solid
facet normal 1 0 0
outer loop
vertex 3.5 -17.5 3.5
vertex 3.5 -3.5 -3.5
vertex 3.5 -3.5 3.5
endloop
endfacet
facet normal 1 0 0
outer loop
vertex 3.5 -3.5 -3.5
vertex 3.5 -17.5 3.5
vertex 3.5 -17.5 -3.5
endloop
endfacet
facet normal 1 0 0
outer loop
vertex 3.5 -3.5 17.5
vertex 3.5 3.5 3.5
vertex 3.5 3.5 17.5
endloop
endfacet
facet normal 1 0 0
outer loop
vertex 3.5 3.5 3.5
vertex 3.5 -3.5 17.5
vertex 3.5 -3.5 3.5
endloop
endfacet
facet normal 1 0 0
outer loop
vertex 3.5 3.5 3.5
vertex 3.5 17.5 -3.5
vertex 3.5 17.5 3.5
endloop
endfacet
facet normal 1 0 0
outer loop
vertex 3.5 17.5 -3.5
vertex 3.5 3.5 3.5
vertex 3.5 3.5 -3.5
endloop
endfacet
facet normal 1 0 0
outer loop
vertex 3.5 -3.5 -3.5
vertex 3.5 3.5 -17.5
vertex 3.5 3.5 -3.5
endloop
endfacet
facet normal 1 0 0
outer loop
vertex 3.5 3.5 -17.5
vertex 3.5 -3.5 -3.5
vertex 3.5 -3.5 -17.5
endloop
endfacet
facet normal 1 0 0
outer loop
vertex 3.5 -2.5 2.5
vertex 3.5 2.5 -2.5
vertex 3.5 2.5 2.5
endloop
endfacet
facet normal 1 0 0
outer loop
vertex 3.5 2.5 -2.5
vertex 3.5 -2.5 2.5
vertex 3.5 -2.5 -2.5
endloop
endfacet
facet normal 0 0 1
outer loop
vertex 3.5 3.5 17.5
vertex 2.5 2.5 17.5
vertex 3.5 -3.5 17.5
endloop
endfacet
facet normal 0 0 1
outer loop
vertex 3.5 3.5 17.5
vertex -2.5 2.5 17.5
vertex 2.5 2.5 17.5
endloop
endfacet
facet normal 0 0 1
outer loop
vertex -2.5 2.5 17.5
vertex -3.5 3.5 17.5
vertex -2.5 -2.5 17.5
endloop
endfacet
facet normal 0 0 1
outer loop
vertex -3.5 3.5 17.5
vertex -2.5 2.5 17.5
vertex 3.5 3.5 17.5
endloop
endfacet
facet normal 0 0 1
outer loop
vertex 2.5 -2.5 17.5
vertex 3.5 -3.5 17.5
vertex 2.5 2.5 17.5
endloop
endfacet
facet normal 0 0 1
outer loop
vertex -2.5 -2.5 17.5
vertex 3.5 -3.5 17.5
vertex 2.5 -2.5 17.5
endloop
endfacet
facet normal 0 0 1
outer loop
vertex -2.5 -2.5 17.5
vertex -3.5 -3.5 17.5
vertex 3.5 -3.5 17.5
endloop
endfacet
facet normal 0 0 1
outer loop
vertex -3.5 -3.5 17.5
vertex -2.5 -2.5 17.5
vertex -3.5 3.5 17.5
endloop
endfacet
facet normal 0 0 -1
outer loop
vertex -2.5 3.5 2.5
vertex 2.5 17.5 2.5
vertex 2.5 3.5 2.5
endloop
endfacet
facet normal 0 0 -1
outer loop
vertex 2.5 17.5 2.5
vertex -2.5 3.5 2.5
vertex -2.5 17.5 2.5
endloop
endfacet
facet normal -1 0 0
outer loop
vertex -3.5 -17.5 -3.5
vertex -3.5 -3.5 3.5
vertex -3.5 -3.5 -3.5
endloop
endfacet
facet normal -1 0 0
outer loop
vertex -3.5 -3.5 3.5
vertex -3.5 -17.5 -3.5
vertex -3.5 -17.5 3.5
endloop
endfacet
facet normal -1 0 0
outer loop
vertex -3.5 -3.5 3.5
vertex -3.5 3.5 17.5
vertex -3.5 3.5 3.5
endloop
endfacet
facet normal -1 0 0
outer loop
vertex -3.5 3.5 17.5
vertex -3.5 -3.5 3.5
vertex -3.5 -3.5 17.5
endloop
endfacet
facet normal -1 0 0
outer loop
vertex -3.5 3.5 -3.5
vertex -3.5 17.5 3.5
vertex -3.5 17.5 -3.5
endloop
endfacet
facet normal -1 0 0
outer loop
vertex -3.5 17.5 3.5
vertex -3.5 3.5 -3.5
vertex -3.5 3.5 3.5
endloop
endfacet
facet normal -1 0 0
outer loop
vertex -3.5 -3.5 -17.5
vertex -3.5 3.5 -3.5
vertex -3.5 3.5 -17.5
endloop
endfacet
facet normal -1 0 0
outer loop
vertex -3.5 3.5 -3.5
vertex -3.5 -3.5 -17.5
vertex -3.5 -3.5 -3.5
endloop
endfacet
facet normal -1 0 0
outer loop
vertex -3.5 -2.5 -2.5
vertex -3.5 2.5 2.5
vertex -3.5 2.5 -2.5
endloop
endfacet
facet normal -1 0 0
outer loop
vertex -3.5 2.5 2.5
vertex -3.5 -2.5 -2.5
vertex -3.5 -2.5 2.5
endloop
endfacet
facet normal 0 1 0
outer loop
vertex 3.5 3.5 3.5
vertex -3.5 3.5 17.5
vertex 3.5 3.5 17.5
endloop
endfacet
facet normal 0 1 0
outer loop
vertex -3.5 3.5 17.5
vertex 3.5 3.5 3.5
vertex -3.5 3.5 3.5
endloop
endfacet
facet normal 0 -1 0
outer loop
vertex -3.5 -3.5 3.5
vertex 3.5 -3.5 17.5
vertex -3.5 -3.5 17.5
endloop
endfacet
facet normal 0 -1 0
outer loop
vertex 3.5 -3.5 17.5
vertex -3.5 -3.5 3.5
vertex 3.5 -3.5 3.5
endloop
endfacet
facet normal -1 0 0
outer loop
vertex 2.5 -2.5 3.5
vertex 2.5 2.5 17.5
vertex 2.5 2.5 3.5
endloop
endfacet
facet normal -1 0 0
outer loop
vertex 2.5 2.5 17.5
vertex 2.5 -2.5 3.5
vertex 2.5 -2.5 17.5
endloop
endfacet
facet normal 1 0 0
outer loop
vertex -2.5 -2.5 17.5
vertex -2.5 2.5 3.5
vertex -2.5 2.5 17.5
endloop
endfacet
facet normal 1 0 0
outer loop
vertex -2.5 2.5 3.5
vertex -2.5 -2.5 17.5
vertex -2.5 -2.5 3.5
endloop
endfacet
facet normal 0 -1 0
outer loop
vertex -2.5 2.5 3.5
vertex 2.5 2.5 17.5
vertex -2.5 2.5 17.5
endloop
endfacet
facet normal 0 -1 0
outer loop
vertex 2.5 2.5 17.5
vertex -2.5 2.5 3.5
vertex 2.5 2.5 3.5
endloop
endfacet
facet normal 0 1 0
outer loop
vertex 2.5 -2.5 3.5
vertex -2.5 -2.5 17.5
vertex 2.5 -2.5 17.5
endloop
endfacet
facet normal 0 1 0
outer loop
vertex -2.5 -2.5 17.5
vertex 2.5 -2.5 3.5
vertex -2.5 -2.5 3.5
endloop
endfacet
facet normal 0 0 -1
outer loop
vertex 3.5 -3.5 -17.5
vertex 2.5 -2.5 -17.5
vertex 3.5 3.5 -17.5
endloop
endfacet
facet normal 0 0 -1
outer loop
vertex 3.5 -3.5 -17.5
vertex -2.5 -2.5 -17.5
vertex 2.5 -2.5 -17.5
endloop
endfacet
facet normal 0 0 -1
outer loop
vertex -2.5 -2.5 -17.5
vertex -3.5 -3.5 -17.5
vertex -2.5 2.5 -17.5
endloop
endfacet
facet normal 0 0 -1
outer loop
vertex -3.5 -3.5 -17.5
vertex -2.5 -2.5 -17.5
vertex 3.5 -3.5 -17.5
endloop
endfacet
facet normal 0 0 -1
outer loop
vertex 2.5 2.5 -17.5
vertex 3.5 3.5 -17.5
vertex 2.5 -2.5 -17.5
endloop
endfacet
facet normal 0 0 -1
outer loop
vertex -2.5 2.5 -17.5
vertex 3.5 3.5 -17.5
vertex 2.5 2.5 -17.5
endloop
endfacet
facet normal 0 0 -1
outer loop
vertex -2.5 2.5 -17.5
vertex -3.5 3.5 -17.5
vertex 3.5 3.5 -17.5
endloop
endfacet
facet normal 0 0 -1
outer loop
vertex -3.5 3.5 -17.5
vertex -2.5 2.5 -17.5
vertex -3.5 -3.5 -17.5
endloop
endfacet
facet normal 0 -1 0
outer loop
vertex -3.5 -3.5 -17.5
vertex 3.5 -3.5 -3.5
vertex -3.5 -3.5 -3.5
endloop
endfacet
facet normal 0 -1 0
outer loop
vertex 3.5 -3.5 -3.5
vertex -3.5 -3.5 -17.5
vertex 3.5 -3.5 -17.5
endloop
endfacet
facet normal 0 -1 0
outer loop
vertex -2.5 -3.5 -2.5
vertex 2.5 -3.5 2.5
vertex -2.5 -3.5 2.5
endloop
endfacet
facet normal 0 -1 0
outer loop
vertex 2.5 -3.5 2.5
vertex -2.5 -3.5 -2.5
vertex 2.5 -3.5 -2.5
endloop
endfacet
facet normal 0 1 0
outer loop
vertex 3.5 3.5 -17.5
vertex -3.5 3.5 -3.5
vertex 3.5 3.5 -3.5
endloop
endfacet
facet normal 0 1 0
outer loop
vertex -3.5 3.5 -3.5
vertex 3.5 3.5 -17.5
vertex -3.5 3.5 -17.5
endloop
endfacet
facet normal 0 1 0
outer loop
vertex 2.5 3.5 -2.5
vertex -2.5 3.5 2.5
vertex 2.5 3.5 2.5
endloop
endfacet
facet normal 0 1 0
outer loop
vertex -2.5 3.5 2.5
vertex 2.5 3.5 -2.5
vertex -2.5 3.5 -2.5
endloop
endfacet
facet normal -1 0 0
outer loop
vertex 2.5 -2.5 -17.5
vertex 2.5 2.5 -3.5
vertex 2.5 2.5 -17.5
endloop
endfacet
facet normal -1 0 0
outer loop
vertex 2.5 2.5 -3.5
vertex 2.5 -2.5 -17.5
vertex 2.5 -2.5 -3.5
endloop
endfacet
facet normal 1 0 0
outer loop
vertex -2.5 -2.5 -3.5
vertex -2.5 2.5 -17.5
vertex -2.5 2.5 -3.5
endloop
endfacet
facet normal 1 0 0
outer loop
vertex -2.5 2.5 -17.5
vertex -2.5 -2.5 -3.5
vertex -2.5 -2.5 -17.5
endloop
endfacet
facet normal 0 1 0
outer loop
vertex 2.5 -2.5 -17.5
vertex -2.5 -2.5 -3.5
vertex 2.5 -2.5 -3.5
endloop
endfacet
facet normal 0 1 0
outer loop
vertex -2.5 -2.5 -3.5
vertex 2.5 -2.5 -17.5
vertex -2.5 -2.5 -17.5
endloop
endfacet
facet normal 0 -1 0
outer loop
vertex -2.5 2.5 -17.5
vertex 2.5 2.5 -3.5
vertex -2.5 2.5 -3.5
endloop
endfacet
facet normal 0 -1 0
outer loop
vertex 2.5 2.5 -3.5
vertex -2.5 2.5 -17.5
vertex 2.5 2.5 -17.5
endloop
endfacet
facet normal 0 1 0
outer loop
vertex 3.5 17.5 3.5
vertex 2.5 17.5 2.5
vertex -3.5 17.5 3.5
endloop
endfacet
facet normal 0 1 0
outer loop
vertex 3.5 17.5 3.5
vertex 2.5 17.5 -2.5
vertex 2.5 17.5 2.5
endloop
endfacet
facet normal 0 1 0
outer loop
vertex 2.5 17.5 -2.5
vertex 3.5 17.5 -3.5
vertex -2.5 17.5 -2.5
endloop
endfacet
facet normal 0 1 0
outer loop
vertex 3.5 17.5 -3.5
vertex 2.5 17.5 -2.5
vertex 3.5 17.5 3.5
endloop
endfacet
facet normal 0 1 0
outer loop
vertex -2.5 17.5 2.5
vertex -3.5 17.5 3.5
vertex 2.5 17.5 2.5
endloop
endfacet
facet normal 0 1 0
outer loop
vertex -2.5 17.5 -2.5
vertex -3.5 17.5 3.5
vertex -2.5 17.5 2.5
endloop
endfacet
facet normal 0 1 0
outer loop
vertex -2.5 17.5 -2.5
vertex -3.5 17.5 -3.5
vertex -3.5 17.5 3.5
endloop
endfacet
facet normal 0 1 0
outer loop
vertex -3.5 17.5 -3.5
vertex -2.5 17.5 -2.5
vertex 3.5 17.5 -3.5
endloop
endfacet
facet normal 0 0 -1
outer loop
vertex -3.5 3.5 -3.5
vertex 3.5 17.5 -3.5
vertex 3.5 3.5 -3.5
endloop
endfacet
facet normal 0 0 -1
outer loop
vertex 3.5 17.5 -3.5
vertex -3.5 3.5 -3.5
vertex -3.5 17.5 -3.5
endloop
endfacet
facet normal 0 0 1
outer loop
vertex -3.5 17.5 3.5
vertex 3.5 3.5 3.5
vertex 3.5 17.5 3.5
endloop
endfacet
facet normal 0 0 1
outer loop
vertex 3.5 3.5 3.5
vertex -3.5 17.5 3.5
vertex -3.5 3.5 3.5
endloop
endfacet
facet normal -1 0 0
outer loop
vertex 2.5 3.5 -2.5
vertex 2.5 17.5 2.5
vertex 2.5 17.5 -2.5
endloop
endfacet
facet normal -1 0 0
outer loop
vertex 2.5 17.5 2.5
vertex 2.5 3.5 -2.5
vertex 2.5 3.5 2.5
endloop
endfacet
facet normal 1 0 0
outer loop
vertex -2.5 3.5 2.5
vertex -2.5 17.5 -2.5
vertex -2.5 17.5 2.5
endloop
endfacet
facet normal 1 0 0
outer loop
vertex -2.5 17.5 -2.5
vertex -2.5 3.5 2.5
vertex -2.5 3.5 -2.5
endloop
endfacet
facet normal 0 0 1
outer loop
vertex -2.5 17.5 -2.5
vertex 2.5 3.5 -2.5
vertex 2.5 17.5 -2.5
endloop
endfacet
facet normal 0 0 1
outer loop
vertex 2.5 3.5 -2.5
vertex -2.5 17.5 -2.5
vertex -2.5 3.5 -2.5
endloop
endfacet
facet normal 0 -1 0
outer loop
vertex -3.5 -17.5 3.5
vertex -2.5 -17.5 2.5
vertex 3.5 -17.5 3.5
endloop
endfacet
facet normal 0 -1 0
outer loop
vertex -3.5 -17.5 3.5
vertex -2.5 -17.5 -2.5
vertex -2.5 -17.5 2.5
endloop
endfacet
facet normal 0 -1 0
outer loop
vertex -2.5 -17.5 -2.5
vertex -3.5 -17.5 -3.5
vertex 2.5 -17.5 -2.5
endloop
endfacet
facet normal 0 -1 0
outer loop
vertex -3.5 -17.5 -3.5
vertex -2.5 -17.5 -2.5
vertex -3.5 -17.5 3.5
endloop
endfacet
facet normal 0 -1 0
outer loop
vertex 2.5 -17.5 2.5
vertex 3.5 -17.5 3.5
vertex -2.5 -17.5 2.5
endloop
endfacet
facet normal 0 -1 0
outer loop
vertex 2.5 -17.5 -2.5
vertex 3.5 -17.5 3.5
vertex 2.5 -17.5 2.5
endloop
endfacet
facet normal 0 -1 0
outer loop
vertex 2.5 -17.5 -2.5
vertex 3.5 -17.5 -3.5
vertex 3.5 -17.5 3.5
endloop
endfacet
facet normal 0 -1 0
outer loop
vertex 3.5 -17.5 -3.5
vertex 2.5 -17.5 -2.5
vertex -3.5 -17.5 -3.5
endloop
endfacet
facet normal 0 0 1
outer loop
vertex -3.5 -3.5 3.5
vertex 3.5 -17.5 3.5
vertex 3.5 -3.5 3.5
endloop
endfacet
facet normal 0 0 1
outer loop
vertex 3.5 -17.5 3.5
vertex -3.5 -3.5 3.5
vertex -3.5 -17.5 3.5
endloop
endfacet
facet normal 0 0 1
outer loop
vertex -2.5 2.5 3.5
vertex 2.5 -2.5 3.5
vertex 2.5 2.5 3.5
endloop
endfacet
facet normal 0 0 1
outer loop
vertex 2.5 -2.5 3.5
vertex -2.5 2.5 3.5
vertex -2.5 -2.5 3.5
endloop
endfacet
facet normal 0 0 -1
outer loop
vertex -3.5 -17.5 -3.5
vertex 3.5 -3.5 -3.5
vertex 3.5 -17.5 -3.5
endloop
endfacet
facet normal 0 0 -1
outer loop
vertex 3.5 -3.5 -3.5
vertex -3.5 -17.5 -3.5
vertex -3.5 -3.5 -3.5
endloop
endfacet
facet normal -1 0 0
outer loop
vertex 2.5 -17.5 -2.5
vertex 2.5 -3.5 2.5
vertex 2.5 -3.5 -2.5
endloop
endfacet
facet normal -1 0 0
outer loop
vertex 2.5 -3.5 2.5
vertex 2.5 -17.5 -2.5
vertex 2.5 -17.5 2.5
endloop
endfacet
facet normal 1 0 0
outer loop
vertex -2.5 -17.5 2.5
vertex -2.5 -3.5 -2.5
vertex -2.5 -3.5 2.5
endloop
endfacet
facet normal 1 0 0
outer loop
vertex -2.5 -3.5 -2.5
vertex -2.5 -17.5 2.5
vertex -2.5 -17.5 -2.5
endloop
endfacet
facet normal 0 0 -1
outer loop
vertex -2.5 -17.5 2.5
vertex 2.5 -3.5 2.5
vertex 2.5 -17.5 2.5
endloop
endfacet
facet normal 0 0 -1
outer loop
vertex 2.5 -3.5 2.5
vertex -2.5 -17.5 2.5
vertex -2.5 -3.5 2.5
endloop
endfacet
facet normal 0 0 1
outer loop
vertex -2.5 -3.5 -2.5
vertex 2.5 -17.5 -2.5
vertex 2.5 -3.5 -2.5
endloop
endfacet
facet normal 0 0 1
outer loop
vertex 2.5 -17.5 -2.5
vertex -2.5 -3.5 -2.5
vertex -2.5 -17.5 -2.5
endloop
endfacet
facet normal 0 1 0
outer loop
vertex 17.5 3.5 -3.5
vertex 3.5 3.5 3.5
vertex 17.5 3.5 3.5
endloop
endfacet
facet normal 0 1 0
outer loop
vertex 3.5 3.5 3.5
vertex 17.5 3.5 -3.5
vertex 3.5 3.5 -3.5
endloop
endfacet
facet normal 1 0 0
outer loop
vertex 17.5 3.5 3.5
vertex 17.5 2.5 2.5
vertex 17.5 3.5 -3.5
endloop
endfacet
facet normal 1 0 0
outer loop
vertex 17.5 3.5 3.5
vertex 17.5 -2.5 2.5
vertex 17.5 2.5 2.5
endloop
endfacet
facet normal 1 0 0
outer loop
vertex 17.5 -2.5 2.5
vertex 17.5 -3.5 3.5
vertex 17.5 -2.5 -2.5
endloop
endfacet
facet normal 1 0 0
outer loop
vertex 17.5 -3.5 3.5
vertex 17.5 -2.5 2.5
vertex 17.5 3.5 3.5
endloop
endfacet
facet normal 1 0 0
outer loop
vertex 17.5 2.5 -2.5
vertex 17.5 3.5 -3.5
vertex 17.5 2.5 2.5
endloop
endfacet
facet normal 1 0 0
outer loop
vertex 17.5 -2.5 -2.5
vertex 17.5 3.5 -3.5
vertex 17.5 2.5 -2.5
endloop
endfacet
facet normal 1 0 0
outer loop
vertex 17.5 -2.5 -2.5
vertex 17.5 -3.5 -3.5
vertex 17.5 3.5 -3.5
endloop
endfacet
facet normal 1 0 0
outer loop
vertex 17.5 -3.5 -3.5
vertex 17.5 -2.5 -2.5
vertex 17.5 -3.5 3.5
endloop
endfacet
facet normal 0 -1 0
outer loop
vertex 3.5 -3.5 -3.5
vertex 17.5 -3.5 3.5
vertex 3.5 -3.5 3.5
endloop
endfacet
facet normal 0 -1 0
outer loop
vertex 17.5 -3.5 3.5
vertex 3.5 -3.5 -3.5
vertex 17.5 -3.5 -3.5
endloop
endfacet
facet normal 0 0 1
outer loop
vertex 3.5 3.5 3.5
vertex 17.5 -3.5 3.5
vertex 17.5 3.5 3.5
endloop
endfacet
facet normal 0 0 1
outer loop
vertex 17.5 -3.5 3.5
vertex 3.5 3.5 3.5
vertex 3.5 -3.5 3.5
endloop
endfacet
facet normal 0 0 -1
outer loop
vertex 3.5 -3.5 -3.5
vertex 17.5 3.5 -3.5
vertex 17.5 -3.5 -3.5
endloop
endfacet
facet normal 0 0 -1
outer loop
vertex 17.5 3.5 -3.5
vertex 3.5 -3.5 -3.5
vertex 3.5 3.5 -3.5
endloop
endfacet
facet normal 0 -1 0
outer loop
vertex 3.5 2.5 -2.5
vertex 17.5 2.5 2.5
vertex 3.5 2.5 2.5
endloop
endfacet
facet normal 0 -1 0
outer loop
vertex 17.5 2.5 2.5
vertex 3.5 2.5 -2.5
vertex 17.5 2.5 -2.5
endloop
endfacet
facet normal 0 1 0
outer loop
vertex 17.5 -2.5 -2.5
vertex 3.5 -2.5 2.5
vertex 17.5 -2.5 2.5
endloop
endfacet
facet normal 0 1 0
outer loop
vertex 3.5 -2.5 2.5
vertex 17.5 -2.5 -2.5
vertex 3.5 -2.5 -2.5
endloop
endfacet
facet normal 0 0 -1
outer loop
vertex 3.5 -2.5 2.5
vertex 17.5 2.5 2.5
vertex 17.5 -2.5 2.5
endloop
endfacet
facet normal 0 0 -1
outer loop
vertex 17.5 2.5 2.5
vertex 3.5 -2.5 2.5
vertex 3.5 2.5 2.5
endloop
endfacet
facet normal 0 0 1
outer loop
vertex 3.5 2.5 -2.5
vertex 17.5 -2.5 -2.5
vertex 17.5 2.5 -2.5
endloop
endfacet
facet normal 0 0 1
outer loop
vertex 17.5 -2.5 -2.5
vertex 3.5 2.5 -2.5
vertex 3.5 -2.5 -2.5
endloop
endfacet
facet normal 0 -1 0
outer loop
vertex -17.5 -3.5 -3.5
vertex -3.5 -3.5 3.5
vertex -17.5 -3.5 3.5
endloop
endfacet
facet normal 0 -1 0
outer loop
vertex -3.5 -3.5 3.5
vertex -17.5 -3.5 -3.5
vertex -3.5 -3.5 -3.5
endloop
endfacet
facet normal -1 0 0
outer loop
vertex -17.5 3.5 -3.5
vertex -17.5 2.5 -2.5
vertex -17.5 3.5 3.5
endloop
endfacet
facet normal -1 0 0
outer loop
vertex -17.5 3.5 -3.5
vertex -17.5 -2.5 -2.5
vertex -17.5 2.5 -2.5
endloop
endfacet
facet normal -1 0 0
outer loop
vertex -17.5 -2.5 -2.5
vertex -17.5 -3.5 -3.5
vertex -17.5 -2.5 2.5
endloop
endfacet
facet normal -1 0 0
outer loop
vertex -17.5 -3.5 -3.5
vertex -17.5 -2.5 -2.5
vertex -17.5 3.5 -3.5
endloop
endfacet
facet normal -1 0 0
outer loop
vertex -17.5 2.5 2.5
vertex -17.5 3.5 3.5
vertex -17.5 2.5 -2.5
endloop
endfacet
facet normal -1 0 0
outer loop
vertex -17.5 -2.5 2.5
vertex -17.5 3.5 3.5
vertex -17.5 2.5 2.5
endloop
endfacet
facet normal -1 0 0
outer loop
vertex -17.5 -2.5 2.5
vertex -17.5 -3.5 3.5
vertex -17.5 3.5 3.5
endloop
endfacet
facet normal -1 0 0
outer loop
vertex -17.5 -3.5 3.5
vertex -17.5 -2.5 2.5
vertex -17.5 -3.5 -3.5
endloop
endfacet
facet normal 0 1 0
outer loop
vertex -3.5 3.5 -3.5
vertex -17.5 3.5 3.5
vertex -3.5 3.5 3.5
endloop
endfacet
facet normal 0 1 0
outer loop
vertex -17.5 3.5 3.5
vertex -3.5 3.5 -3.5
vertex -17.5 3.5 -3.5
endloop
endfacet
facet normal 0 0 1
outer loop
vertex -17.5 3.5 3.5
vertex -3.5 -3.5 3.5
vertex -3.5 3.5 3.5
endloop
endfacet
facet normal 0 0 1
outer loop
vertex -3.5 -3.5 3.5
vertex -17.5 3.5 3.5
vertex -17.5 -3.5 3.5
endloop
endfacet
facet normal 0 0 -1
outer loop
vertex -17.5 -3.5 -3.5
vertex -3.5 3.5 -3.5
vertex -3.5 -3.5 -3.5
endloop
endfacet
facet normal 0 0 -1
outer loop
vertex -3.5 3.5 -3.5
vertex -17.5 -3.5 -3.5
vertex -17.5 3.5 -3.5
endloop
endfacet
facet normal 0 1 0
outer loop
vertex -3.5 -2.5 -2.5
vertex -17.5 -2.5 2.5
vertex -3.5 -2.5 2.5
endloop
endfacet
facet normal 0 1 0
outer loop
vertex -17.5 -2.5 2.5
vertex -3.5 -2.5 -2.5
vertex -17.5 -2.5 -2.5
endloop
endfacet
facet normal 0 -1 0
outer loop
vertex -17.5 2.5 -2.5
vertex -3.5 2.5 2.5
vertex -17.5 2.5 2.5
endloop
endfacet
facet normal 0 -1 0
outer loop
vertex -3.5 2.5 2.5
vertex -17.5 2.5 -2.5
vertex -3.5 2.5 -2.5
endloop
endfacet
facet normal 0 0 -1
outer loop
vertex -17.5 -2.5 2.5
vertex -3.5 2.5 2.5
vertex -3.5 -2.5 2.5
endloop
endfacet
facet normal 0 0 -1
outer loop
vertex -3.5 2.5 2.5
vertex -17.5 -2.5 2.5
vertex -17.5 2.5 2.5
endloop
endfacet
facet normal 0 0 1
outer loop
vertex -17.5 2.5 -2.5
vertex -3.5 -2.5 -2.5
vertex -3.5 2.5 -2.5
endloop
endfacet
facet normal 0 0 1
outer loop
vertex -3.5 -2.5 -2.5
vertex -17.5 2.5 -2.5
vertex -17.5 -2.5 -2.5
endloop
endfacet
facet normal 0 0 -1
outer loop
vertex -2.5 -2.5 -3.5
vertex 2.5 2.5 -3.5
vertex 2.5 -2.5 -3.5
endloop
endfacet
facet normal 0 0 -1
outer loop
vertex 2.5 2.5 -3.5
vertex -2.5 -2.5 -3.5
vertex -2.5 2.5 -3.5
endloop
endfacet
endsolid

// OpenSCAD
// Combination of n,s,e,w,u,d (lower case = no support, upper case=with support)
directions = "nsewud";

cube([7,7,7],center=true);


if (search("u",directions)) stick(); //up
if (search("d",directions)) rotate ([180,0,0]) stick("yellow",false);
if (search("n",directions)) rotate ([-90,0,0]) stick("green",false);
if (search("s",directions)) rotate ([90,0,0]) stick("blue",false);
if (search("e",directions)) rotate ([90,0,90]) stick("white",false);
if (search("w",directions)) rotate ([90,0,-90]) stick("brown",false);

if (search("U",directions)) stick("red",true); //up
if (search("D",directions)) rotate ([180,0,0]) stick("yellow",true);
if (search("N",directions)) rotate ([-90,0,0]) stick("green",true);
if (search("S",directions)) rotate ([90,0,0]) stick("blue",true);
if (search("E",directions)) rotate ([90,0,90]) stick("white",true);
if (search("W",directions)) rotate ([90,0,-90]) stick("brown",true);

module stick(col="red",support=false) {
    color(col){
        translate ([0,0,10]) {
            if (support==true) translate ([0,0,0.5]) cube([0.1,7,13],center=true);
            difference() {
                cube([7,7,15],center=true);
                cube([5,5,17],center=true);
            }
        }
    }
}
